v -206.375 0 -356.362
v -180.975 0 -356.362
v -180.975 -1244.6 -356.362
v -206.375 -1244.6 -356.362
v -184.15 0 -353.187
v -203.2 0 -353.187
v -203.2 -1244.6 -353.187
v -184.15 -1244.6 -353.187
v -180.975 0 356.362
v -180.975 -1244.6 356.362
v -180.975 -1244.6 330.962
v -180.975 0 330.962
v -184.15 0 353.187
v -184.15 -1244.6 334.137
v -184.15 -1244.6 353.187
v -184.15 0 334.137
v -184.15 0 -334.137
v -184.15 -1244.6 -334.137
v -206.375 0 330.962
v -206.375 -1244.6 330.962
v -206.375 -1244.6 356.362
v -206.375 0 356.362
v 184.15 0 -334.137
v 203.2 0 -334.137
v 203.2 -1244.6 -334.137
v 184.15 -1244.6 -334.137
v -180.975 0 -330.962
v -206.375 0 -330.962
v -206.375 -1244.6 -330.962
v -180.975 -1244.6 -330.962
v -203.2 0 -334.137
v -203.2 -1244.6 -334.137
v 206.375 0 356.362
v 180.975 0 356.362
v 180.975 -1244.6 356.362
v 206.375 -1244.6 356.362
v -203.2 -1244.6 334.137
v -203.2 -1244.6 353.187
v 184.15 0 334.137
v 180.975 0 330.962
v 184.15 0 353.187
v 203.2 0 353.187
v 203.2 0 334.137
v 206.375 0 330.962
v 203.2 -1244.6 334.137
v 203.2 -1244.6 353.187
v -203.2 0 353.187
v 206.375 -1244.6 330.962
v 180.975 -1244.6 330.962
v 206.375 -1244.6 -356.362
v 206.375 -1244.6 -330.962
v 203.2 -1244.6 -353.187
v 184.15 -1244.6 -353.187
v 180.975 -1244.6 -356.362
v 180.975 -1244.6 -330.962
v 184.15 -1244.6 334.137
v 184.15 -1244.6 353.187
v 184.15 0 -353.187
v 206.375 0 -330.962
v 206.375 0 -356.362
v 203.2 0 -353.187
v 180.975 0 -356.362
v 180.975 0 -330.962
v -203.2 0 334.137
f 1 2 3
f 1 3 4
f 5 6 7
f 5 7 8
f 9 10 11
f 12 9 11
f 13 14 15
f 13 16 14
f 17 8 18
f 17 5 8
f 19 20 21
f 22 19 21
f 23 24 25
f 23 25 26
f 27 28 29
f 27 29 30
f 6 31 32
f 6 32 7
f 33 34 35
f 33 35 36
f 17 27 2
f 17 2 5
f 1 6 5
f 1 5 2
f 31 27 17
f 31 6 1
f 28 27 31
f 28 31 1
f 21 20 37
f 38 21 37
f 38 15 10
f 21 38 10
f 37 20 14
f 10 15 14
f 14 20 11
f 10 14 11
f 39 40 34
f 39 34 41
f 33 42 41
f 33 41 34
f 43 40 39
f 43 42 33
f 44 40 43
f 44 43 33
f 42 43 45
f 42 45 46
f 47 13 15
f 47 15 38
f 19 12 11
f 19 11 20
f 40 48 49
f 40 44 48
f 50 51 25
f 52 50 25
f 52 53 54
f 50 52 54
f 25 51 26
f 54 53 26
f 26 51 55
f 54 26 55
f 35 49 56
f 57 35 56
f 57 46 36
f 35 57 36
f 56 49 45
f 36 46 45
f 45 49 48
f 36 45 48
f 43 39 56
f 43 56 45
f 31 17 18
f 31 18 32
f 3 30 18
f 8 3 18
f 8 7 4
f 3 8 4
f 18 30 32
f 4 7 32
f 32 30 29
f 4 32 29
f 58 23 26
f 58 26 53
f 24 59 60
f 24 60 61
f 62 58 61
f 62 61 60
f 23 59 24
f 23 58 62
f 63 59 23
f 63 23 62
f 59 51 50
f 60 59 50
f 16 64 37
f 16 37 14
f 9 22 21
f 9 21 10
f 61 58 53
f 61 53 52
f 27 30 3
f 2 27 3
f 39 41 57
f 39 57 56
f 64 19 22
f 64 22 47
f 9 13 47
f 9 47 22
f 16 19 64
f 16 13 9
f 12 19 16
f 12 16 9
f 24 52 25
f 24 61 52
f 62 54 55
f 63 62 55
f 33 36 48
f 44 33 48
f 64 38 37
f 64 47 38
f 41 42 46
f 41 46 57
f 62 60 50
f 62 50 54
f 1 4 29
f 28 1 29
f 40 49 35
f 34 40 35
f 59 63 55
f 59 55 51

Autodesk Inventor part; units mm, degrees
ref_plane "YZ Plane" through (0, 0, 0) normal (1, 0, 0) x (0, 1, 0)
ref_plane "XZ Plane" through (0, 0, 0) normal (0, 1, 0) x (-1, 0, 0)
ref_plane "XY Plane" through (0, 0, 0) normal (0, 0, 1) x (1, 0, 0)
sketch "Sketch1" plane through (0, 0, 0) normal (0, 1, 0) x (-1, 0, 0)
  line L0 (206.375, 356.362) -> (-206.375, 356.362) construction
  line L1 (-206.375, 356.362) -> (-206.375, -356.362) construction
  line L2 (-206.375, -356.362) -> (206.375, -356.362) construction
  line L3 (206.375, -356.362) -> (206.375, 356.362) construction
  line L4 (206.375, 356.362) -> (-206.375, -356.362) construction
  line L5 (-206.375, 356.362) -> (206.375, -356.362) construction
  line L6 (-206.375, -356.362) -> (-180.975, -356.362)
  line L7 (-180.975, -356.362) -> (-180.975, -330.962)
  line L8 (-180.975, -330.962) -> (-206.375, -330.962)
  line L9 (-206.375, -330.962) -> (-206.375, -356.362)
  line L10 (-203.2, -334.137) -> (-184.15, -334.137)
  line L11 (-184.15, -334.137) -> (-184.15, -353.187)
  line L12 (-184.15, -353.187) -> (-203.2, -353.187)
  line L13 (-203.2, -353.187) -> (-203.2, -334.137)
  line L14 (-203.2, -334.137) -> (-184.15, -353.187) construction
  line L15 (-184.15, -334.137) -> (-203.2, -353.187) construction
  point P0 (0, 0)
  point P1 (-193.675, -343.662)
  dimension "d0" = 412.75
  dimension "d1" = 712.724
  dimension "d2" = 25.4
  dimension "d3" = 25.4
  dimension "d4" = 19.05
  dimension "d5" = 19.05
extrude "Extrusion1" add sketch "Sketch1" against normal blind 1244.6
mirror "Mirror1" about plane through (0, 0, 0) normal (1, 0, 0) of "Extrusion1"
mirror "Mirror2" about plane through (0, 0, 0) normal (0, 0, 1) of "Extrusion1", "Mirror1"
properties part number "supportForLift" material "Aluminum 6061"
